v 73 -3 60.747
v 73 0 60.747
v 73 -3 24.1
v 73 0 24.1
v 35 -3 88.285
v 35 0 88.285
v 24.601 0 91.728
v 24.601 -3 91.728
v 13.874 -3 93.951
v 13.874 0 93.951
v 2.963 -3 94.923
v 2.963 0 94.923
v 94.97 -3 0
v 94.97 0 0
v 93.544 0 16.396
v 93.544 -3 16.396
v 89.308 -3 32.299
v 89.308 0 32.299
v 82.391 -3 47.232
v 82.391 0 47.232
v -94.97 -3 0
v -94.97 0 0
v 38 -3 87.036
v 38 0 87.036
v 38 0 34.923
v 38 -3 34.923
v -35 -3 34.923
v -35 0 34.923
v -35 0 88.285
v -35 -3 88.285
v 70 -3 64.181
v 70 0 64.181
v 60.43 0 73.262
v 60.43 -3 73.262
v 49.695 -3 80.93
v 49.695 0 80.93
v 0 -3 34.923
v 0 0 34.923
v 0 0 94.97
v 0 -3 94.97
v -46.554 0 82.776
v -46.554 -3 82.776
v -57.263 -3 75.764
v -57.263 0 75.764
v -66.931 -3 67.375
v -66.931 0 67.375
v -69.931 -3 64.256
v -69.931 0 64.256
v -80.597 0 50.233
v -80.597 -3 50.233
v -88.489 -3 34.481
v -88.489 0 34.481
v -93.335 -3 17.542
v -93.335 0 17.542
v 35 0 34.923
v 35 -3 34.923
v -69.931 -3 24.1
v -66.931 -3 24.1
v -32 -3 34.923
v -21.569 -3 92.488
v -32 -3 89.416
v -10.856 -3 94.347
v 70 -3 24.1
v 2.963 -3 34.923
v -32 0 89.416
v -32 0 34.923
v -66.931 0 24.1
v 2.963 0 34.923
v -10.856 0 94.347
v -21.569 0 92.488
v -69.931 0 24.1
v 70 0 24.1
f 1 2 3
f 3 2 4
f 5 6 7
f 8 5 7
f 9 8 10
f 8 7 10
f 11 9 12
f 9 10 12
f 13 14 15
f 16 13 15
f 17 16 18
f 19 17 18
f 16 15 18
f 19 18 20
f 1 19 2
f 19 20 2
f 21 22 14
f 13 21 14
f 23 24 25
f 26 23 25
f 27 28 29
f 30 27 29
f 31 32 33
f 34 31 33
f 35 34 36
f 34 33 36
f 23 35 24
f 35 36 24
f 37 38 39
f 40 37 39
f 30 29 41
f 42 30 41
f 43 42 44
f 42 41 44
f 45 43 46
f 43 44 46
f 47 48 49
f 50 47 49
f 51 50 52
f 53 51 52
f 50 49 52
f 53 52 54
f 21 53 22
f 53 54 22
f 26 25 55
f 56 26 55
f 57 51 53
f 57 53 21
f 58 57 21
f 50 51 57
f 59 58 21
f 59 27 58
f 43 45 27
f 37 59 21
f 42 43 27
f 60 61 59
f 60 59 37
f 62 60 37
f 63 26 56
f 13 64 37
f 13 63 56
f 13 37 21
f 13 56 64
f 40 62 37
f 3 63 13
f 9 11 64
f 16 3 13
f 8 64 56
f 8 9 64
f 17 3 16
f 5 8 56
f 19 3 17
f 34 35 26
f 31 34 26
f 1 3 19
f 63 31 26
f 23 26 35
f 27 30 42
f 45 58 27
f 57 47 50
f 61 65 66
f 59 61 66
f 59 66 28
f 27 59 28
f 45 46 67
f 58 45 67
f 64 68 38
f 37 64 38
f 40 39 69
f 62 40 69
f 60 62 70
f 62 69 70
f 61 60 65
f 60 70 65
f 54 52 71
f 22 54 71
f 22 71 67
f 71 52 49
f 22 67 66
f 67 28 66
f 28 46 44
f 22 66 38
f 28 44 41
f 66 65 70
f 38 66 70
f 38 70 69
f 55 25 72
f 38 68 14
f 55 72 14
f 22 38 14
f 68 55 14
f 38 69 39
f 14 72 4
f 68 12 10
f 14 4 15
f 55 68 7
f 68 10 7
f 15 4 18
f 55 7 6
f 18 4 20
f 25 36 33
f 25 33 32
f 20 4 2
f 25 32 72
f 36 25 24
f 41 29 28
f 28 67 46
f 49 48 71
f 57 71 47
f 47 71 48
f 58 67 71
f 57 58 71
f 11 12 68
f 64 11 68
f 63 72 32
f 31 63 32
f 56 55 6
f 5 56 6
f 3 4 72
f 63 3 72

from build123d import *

# Parameters (mm, degrees)
F1_DEPTH = 3


with BuildPart() as f1:
    # F0 (on Front) → F1 (new body)
    with BuildSketch(Plane.XZ):
        with BuildLine():
            Line((70, 0), (94.969561, 0))
            ThreePointArc((94.969561, 0), (89.308441, 32.298913), (73, 60.74716))
            Line((73, 60.74716), (73, 24.099964))
            Line((73, 24.099964), (70, 24.099964))
            Line((70, 24.099964), (70, 64.18113))
            ThreePointArc((70, 64.18113), (55.195862, 77.28282), (38, 87.035725))
            Line((38, 87.035725), (38, 34.923317))
            Line((38, 34.923317), (35, 34.923317))
            Line((35, 34.923317), (35, 88.284865))
            ThreePointArc((35, 88.284865), (19.269689, 92.994067), (2.963333, 94.923317))
            Line((2.963333, 94.923317), (2.963333, 34.923317))
            Line((2.963333, 34.923317), (0, 34.923317))
            Line((0, 34.923317), (0, 94.969561))
            ThreePointArc((0, 94.969561), (-16.239168, 93.570865), (-32, 89.41598))
            Line((-32, 89.41598), (-32, 34.923317))
            Line((-32, 34.923317), (-35, 34.923317))
            Line((-35, 34.923317), (-35, 88.284865))
            ThreePointArc((-35, 88.284865), (-52.026967, 79.45069), (-66.931372, 67.375136))
            Line((-66.931372, 67.375136), (-66.931372, 24.099964))
            Line((-66.931372, 24.099964), (-69.931372, 24.099964))
            Line((-69.931372, 24.099964), (-69.931372, 64.2559))
            ThreePointArc((-69.931372, 64.2559), (-88.488895, 34.480906), (-94.969561, 0))
            Line((-94.969561, 0), (-69.931372, 0))
            Line((-69.931372, 0), (-35, 0))
            Line((-35, 0), (0, 0))
            Line((0, 0), (35, 0))
            Line((35, 0), (70, 0))
        make_face()
    extrude(amount=F1_DEPTH)


solid = f1.part
